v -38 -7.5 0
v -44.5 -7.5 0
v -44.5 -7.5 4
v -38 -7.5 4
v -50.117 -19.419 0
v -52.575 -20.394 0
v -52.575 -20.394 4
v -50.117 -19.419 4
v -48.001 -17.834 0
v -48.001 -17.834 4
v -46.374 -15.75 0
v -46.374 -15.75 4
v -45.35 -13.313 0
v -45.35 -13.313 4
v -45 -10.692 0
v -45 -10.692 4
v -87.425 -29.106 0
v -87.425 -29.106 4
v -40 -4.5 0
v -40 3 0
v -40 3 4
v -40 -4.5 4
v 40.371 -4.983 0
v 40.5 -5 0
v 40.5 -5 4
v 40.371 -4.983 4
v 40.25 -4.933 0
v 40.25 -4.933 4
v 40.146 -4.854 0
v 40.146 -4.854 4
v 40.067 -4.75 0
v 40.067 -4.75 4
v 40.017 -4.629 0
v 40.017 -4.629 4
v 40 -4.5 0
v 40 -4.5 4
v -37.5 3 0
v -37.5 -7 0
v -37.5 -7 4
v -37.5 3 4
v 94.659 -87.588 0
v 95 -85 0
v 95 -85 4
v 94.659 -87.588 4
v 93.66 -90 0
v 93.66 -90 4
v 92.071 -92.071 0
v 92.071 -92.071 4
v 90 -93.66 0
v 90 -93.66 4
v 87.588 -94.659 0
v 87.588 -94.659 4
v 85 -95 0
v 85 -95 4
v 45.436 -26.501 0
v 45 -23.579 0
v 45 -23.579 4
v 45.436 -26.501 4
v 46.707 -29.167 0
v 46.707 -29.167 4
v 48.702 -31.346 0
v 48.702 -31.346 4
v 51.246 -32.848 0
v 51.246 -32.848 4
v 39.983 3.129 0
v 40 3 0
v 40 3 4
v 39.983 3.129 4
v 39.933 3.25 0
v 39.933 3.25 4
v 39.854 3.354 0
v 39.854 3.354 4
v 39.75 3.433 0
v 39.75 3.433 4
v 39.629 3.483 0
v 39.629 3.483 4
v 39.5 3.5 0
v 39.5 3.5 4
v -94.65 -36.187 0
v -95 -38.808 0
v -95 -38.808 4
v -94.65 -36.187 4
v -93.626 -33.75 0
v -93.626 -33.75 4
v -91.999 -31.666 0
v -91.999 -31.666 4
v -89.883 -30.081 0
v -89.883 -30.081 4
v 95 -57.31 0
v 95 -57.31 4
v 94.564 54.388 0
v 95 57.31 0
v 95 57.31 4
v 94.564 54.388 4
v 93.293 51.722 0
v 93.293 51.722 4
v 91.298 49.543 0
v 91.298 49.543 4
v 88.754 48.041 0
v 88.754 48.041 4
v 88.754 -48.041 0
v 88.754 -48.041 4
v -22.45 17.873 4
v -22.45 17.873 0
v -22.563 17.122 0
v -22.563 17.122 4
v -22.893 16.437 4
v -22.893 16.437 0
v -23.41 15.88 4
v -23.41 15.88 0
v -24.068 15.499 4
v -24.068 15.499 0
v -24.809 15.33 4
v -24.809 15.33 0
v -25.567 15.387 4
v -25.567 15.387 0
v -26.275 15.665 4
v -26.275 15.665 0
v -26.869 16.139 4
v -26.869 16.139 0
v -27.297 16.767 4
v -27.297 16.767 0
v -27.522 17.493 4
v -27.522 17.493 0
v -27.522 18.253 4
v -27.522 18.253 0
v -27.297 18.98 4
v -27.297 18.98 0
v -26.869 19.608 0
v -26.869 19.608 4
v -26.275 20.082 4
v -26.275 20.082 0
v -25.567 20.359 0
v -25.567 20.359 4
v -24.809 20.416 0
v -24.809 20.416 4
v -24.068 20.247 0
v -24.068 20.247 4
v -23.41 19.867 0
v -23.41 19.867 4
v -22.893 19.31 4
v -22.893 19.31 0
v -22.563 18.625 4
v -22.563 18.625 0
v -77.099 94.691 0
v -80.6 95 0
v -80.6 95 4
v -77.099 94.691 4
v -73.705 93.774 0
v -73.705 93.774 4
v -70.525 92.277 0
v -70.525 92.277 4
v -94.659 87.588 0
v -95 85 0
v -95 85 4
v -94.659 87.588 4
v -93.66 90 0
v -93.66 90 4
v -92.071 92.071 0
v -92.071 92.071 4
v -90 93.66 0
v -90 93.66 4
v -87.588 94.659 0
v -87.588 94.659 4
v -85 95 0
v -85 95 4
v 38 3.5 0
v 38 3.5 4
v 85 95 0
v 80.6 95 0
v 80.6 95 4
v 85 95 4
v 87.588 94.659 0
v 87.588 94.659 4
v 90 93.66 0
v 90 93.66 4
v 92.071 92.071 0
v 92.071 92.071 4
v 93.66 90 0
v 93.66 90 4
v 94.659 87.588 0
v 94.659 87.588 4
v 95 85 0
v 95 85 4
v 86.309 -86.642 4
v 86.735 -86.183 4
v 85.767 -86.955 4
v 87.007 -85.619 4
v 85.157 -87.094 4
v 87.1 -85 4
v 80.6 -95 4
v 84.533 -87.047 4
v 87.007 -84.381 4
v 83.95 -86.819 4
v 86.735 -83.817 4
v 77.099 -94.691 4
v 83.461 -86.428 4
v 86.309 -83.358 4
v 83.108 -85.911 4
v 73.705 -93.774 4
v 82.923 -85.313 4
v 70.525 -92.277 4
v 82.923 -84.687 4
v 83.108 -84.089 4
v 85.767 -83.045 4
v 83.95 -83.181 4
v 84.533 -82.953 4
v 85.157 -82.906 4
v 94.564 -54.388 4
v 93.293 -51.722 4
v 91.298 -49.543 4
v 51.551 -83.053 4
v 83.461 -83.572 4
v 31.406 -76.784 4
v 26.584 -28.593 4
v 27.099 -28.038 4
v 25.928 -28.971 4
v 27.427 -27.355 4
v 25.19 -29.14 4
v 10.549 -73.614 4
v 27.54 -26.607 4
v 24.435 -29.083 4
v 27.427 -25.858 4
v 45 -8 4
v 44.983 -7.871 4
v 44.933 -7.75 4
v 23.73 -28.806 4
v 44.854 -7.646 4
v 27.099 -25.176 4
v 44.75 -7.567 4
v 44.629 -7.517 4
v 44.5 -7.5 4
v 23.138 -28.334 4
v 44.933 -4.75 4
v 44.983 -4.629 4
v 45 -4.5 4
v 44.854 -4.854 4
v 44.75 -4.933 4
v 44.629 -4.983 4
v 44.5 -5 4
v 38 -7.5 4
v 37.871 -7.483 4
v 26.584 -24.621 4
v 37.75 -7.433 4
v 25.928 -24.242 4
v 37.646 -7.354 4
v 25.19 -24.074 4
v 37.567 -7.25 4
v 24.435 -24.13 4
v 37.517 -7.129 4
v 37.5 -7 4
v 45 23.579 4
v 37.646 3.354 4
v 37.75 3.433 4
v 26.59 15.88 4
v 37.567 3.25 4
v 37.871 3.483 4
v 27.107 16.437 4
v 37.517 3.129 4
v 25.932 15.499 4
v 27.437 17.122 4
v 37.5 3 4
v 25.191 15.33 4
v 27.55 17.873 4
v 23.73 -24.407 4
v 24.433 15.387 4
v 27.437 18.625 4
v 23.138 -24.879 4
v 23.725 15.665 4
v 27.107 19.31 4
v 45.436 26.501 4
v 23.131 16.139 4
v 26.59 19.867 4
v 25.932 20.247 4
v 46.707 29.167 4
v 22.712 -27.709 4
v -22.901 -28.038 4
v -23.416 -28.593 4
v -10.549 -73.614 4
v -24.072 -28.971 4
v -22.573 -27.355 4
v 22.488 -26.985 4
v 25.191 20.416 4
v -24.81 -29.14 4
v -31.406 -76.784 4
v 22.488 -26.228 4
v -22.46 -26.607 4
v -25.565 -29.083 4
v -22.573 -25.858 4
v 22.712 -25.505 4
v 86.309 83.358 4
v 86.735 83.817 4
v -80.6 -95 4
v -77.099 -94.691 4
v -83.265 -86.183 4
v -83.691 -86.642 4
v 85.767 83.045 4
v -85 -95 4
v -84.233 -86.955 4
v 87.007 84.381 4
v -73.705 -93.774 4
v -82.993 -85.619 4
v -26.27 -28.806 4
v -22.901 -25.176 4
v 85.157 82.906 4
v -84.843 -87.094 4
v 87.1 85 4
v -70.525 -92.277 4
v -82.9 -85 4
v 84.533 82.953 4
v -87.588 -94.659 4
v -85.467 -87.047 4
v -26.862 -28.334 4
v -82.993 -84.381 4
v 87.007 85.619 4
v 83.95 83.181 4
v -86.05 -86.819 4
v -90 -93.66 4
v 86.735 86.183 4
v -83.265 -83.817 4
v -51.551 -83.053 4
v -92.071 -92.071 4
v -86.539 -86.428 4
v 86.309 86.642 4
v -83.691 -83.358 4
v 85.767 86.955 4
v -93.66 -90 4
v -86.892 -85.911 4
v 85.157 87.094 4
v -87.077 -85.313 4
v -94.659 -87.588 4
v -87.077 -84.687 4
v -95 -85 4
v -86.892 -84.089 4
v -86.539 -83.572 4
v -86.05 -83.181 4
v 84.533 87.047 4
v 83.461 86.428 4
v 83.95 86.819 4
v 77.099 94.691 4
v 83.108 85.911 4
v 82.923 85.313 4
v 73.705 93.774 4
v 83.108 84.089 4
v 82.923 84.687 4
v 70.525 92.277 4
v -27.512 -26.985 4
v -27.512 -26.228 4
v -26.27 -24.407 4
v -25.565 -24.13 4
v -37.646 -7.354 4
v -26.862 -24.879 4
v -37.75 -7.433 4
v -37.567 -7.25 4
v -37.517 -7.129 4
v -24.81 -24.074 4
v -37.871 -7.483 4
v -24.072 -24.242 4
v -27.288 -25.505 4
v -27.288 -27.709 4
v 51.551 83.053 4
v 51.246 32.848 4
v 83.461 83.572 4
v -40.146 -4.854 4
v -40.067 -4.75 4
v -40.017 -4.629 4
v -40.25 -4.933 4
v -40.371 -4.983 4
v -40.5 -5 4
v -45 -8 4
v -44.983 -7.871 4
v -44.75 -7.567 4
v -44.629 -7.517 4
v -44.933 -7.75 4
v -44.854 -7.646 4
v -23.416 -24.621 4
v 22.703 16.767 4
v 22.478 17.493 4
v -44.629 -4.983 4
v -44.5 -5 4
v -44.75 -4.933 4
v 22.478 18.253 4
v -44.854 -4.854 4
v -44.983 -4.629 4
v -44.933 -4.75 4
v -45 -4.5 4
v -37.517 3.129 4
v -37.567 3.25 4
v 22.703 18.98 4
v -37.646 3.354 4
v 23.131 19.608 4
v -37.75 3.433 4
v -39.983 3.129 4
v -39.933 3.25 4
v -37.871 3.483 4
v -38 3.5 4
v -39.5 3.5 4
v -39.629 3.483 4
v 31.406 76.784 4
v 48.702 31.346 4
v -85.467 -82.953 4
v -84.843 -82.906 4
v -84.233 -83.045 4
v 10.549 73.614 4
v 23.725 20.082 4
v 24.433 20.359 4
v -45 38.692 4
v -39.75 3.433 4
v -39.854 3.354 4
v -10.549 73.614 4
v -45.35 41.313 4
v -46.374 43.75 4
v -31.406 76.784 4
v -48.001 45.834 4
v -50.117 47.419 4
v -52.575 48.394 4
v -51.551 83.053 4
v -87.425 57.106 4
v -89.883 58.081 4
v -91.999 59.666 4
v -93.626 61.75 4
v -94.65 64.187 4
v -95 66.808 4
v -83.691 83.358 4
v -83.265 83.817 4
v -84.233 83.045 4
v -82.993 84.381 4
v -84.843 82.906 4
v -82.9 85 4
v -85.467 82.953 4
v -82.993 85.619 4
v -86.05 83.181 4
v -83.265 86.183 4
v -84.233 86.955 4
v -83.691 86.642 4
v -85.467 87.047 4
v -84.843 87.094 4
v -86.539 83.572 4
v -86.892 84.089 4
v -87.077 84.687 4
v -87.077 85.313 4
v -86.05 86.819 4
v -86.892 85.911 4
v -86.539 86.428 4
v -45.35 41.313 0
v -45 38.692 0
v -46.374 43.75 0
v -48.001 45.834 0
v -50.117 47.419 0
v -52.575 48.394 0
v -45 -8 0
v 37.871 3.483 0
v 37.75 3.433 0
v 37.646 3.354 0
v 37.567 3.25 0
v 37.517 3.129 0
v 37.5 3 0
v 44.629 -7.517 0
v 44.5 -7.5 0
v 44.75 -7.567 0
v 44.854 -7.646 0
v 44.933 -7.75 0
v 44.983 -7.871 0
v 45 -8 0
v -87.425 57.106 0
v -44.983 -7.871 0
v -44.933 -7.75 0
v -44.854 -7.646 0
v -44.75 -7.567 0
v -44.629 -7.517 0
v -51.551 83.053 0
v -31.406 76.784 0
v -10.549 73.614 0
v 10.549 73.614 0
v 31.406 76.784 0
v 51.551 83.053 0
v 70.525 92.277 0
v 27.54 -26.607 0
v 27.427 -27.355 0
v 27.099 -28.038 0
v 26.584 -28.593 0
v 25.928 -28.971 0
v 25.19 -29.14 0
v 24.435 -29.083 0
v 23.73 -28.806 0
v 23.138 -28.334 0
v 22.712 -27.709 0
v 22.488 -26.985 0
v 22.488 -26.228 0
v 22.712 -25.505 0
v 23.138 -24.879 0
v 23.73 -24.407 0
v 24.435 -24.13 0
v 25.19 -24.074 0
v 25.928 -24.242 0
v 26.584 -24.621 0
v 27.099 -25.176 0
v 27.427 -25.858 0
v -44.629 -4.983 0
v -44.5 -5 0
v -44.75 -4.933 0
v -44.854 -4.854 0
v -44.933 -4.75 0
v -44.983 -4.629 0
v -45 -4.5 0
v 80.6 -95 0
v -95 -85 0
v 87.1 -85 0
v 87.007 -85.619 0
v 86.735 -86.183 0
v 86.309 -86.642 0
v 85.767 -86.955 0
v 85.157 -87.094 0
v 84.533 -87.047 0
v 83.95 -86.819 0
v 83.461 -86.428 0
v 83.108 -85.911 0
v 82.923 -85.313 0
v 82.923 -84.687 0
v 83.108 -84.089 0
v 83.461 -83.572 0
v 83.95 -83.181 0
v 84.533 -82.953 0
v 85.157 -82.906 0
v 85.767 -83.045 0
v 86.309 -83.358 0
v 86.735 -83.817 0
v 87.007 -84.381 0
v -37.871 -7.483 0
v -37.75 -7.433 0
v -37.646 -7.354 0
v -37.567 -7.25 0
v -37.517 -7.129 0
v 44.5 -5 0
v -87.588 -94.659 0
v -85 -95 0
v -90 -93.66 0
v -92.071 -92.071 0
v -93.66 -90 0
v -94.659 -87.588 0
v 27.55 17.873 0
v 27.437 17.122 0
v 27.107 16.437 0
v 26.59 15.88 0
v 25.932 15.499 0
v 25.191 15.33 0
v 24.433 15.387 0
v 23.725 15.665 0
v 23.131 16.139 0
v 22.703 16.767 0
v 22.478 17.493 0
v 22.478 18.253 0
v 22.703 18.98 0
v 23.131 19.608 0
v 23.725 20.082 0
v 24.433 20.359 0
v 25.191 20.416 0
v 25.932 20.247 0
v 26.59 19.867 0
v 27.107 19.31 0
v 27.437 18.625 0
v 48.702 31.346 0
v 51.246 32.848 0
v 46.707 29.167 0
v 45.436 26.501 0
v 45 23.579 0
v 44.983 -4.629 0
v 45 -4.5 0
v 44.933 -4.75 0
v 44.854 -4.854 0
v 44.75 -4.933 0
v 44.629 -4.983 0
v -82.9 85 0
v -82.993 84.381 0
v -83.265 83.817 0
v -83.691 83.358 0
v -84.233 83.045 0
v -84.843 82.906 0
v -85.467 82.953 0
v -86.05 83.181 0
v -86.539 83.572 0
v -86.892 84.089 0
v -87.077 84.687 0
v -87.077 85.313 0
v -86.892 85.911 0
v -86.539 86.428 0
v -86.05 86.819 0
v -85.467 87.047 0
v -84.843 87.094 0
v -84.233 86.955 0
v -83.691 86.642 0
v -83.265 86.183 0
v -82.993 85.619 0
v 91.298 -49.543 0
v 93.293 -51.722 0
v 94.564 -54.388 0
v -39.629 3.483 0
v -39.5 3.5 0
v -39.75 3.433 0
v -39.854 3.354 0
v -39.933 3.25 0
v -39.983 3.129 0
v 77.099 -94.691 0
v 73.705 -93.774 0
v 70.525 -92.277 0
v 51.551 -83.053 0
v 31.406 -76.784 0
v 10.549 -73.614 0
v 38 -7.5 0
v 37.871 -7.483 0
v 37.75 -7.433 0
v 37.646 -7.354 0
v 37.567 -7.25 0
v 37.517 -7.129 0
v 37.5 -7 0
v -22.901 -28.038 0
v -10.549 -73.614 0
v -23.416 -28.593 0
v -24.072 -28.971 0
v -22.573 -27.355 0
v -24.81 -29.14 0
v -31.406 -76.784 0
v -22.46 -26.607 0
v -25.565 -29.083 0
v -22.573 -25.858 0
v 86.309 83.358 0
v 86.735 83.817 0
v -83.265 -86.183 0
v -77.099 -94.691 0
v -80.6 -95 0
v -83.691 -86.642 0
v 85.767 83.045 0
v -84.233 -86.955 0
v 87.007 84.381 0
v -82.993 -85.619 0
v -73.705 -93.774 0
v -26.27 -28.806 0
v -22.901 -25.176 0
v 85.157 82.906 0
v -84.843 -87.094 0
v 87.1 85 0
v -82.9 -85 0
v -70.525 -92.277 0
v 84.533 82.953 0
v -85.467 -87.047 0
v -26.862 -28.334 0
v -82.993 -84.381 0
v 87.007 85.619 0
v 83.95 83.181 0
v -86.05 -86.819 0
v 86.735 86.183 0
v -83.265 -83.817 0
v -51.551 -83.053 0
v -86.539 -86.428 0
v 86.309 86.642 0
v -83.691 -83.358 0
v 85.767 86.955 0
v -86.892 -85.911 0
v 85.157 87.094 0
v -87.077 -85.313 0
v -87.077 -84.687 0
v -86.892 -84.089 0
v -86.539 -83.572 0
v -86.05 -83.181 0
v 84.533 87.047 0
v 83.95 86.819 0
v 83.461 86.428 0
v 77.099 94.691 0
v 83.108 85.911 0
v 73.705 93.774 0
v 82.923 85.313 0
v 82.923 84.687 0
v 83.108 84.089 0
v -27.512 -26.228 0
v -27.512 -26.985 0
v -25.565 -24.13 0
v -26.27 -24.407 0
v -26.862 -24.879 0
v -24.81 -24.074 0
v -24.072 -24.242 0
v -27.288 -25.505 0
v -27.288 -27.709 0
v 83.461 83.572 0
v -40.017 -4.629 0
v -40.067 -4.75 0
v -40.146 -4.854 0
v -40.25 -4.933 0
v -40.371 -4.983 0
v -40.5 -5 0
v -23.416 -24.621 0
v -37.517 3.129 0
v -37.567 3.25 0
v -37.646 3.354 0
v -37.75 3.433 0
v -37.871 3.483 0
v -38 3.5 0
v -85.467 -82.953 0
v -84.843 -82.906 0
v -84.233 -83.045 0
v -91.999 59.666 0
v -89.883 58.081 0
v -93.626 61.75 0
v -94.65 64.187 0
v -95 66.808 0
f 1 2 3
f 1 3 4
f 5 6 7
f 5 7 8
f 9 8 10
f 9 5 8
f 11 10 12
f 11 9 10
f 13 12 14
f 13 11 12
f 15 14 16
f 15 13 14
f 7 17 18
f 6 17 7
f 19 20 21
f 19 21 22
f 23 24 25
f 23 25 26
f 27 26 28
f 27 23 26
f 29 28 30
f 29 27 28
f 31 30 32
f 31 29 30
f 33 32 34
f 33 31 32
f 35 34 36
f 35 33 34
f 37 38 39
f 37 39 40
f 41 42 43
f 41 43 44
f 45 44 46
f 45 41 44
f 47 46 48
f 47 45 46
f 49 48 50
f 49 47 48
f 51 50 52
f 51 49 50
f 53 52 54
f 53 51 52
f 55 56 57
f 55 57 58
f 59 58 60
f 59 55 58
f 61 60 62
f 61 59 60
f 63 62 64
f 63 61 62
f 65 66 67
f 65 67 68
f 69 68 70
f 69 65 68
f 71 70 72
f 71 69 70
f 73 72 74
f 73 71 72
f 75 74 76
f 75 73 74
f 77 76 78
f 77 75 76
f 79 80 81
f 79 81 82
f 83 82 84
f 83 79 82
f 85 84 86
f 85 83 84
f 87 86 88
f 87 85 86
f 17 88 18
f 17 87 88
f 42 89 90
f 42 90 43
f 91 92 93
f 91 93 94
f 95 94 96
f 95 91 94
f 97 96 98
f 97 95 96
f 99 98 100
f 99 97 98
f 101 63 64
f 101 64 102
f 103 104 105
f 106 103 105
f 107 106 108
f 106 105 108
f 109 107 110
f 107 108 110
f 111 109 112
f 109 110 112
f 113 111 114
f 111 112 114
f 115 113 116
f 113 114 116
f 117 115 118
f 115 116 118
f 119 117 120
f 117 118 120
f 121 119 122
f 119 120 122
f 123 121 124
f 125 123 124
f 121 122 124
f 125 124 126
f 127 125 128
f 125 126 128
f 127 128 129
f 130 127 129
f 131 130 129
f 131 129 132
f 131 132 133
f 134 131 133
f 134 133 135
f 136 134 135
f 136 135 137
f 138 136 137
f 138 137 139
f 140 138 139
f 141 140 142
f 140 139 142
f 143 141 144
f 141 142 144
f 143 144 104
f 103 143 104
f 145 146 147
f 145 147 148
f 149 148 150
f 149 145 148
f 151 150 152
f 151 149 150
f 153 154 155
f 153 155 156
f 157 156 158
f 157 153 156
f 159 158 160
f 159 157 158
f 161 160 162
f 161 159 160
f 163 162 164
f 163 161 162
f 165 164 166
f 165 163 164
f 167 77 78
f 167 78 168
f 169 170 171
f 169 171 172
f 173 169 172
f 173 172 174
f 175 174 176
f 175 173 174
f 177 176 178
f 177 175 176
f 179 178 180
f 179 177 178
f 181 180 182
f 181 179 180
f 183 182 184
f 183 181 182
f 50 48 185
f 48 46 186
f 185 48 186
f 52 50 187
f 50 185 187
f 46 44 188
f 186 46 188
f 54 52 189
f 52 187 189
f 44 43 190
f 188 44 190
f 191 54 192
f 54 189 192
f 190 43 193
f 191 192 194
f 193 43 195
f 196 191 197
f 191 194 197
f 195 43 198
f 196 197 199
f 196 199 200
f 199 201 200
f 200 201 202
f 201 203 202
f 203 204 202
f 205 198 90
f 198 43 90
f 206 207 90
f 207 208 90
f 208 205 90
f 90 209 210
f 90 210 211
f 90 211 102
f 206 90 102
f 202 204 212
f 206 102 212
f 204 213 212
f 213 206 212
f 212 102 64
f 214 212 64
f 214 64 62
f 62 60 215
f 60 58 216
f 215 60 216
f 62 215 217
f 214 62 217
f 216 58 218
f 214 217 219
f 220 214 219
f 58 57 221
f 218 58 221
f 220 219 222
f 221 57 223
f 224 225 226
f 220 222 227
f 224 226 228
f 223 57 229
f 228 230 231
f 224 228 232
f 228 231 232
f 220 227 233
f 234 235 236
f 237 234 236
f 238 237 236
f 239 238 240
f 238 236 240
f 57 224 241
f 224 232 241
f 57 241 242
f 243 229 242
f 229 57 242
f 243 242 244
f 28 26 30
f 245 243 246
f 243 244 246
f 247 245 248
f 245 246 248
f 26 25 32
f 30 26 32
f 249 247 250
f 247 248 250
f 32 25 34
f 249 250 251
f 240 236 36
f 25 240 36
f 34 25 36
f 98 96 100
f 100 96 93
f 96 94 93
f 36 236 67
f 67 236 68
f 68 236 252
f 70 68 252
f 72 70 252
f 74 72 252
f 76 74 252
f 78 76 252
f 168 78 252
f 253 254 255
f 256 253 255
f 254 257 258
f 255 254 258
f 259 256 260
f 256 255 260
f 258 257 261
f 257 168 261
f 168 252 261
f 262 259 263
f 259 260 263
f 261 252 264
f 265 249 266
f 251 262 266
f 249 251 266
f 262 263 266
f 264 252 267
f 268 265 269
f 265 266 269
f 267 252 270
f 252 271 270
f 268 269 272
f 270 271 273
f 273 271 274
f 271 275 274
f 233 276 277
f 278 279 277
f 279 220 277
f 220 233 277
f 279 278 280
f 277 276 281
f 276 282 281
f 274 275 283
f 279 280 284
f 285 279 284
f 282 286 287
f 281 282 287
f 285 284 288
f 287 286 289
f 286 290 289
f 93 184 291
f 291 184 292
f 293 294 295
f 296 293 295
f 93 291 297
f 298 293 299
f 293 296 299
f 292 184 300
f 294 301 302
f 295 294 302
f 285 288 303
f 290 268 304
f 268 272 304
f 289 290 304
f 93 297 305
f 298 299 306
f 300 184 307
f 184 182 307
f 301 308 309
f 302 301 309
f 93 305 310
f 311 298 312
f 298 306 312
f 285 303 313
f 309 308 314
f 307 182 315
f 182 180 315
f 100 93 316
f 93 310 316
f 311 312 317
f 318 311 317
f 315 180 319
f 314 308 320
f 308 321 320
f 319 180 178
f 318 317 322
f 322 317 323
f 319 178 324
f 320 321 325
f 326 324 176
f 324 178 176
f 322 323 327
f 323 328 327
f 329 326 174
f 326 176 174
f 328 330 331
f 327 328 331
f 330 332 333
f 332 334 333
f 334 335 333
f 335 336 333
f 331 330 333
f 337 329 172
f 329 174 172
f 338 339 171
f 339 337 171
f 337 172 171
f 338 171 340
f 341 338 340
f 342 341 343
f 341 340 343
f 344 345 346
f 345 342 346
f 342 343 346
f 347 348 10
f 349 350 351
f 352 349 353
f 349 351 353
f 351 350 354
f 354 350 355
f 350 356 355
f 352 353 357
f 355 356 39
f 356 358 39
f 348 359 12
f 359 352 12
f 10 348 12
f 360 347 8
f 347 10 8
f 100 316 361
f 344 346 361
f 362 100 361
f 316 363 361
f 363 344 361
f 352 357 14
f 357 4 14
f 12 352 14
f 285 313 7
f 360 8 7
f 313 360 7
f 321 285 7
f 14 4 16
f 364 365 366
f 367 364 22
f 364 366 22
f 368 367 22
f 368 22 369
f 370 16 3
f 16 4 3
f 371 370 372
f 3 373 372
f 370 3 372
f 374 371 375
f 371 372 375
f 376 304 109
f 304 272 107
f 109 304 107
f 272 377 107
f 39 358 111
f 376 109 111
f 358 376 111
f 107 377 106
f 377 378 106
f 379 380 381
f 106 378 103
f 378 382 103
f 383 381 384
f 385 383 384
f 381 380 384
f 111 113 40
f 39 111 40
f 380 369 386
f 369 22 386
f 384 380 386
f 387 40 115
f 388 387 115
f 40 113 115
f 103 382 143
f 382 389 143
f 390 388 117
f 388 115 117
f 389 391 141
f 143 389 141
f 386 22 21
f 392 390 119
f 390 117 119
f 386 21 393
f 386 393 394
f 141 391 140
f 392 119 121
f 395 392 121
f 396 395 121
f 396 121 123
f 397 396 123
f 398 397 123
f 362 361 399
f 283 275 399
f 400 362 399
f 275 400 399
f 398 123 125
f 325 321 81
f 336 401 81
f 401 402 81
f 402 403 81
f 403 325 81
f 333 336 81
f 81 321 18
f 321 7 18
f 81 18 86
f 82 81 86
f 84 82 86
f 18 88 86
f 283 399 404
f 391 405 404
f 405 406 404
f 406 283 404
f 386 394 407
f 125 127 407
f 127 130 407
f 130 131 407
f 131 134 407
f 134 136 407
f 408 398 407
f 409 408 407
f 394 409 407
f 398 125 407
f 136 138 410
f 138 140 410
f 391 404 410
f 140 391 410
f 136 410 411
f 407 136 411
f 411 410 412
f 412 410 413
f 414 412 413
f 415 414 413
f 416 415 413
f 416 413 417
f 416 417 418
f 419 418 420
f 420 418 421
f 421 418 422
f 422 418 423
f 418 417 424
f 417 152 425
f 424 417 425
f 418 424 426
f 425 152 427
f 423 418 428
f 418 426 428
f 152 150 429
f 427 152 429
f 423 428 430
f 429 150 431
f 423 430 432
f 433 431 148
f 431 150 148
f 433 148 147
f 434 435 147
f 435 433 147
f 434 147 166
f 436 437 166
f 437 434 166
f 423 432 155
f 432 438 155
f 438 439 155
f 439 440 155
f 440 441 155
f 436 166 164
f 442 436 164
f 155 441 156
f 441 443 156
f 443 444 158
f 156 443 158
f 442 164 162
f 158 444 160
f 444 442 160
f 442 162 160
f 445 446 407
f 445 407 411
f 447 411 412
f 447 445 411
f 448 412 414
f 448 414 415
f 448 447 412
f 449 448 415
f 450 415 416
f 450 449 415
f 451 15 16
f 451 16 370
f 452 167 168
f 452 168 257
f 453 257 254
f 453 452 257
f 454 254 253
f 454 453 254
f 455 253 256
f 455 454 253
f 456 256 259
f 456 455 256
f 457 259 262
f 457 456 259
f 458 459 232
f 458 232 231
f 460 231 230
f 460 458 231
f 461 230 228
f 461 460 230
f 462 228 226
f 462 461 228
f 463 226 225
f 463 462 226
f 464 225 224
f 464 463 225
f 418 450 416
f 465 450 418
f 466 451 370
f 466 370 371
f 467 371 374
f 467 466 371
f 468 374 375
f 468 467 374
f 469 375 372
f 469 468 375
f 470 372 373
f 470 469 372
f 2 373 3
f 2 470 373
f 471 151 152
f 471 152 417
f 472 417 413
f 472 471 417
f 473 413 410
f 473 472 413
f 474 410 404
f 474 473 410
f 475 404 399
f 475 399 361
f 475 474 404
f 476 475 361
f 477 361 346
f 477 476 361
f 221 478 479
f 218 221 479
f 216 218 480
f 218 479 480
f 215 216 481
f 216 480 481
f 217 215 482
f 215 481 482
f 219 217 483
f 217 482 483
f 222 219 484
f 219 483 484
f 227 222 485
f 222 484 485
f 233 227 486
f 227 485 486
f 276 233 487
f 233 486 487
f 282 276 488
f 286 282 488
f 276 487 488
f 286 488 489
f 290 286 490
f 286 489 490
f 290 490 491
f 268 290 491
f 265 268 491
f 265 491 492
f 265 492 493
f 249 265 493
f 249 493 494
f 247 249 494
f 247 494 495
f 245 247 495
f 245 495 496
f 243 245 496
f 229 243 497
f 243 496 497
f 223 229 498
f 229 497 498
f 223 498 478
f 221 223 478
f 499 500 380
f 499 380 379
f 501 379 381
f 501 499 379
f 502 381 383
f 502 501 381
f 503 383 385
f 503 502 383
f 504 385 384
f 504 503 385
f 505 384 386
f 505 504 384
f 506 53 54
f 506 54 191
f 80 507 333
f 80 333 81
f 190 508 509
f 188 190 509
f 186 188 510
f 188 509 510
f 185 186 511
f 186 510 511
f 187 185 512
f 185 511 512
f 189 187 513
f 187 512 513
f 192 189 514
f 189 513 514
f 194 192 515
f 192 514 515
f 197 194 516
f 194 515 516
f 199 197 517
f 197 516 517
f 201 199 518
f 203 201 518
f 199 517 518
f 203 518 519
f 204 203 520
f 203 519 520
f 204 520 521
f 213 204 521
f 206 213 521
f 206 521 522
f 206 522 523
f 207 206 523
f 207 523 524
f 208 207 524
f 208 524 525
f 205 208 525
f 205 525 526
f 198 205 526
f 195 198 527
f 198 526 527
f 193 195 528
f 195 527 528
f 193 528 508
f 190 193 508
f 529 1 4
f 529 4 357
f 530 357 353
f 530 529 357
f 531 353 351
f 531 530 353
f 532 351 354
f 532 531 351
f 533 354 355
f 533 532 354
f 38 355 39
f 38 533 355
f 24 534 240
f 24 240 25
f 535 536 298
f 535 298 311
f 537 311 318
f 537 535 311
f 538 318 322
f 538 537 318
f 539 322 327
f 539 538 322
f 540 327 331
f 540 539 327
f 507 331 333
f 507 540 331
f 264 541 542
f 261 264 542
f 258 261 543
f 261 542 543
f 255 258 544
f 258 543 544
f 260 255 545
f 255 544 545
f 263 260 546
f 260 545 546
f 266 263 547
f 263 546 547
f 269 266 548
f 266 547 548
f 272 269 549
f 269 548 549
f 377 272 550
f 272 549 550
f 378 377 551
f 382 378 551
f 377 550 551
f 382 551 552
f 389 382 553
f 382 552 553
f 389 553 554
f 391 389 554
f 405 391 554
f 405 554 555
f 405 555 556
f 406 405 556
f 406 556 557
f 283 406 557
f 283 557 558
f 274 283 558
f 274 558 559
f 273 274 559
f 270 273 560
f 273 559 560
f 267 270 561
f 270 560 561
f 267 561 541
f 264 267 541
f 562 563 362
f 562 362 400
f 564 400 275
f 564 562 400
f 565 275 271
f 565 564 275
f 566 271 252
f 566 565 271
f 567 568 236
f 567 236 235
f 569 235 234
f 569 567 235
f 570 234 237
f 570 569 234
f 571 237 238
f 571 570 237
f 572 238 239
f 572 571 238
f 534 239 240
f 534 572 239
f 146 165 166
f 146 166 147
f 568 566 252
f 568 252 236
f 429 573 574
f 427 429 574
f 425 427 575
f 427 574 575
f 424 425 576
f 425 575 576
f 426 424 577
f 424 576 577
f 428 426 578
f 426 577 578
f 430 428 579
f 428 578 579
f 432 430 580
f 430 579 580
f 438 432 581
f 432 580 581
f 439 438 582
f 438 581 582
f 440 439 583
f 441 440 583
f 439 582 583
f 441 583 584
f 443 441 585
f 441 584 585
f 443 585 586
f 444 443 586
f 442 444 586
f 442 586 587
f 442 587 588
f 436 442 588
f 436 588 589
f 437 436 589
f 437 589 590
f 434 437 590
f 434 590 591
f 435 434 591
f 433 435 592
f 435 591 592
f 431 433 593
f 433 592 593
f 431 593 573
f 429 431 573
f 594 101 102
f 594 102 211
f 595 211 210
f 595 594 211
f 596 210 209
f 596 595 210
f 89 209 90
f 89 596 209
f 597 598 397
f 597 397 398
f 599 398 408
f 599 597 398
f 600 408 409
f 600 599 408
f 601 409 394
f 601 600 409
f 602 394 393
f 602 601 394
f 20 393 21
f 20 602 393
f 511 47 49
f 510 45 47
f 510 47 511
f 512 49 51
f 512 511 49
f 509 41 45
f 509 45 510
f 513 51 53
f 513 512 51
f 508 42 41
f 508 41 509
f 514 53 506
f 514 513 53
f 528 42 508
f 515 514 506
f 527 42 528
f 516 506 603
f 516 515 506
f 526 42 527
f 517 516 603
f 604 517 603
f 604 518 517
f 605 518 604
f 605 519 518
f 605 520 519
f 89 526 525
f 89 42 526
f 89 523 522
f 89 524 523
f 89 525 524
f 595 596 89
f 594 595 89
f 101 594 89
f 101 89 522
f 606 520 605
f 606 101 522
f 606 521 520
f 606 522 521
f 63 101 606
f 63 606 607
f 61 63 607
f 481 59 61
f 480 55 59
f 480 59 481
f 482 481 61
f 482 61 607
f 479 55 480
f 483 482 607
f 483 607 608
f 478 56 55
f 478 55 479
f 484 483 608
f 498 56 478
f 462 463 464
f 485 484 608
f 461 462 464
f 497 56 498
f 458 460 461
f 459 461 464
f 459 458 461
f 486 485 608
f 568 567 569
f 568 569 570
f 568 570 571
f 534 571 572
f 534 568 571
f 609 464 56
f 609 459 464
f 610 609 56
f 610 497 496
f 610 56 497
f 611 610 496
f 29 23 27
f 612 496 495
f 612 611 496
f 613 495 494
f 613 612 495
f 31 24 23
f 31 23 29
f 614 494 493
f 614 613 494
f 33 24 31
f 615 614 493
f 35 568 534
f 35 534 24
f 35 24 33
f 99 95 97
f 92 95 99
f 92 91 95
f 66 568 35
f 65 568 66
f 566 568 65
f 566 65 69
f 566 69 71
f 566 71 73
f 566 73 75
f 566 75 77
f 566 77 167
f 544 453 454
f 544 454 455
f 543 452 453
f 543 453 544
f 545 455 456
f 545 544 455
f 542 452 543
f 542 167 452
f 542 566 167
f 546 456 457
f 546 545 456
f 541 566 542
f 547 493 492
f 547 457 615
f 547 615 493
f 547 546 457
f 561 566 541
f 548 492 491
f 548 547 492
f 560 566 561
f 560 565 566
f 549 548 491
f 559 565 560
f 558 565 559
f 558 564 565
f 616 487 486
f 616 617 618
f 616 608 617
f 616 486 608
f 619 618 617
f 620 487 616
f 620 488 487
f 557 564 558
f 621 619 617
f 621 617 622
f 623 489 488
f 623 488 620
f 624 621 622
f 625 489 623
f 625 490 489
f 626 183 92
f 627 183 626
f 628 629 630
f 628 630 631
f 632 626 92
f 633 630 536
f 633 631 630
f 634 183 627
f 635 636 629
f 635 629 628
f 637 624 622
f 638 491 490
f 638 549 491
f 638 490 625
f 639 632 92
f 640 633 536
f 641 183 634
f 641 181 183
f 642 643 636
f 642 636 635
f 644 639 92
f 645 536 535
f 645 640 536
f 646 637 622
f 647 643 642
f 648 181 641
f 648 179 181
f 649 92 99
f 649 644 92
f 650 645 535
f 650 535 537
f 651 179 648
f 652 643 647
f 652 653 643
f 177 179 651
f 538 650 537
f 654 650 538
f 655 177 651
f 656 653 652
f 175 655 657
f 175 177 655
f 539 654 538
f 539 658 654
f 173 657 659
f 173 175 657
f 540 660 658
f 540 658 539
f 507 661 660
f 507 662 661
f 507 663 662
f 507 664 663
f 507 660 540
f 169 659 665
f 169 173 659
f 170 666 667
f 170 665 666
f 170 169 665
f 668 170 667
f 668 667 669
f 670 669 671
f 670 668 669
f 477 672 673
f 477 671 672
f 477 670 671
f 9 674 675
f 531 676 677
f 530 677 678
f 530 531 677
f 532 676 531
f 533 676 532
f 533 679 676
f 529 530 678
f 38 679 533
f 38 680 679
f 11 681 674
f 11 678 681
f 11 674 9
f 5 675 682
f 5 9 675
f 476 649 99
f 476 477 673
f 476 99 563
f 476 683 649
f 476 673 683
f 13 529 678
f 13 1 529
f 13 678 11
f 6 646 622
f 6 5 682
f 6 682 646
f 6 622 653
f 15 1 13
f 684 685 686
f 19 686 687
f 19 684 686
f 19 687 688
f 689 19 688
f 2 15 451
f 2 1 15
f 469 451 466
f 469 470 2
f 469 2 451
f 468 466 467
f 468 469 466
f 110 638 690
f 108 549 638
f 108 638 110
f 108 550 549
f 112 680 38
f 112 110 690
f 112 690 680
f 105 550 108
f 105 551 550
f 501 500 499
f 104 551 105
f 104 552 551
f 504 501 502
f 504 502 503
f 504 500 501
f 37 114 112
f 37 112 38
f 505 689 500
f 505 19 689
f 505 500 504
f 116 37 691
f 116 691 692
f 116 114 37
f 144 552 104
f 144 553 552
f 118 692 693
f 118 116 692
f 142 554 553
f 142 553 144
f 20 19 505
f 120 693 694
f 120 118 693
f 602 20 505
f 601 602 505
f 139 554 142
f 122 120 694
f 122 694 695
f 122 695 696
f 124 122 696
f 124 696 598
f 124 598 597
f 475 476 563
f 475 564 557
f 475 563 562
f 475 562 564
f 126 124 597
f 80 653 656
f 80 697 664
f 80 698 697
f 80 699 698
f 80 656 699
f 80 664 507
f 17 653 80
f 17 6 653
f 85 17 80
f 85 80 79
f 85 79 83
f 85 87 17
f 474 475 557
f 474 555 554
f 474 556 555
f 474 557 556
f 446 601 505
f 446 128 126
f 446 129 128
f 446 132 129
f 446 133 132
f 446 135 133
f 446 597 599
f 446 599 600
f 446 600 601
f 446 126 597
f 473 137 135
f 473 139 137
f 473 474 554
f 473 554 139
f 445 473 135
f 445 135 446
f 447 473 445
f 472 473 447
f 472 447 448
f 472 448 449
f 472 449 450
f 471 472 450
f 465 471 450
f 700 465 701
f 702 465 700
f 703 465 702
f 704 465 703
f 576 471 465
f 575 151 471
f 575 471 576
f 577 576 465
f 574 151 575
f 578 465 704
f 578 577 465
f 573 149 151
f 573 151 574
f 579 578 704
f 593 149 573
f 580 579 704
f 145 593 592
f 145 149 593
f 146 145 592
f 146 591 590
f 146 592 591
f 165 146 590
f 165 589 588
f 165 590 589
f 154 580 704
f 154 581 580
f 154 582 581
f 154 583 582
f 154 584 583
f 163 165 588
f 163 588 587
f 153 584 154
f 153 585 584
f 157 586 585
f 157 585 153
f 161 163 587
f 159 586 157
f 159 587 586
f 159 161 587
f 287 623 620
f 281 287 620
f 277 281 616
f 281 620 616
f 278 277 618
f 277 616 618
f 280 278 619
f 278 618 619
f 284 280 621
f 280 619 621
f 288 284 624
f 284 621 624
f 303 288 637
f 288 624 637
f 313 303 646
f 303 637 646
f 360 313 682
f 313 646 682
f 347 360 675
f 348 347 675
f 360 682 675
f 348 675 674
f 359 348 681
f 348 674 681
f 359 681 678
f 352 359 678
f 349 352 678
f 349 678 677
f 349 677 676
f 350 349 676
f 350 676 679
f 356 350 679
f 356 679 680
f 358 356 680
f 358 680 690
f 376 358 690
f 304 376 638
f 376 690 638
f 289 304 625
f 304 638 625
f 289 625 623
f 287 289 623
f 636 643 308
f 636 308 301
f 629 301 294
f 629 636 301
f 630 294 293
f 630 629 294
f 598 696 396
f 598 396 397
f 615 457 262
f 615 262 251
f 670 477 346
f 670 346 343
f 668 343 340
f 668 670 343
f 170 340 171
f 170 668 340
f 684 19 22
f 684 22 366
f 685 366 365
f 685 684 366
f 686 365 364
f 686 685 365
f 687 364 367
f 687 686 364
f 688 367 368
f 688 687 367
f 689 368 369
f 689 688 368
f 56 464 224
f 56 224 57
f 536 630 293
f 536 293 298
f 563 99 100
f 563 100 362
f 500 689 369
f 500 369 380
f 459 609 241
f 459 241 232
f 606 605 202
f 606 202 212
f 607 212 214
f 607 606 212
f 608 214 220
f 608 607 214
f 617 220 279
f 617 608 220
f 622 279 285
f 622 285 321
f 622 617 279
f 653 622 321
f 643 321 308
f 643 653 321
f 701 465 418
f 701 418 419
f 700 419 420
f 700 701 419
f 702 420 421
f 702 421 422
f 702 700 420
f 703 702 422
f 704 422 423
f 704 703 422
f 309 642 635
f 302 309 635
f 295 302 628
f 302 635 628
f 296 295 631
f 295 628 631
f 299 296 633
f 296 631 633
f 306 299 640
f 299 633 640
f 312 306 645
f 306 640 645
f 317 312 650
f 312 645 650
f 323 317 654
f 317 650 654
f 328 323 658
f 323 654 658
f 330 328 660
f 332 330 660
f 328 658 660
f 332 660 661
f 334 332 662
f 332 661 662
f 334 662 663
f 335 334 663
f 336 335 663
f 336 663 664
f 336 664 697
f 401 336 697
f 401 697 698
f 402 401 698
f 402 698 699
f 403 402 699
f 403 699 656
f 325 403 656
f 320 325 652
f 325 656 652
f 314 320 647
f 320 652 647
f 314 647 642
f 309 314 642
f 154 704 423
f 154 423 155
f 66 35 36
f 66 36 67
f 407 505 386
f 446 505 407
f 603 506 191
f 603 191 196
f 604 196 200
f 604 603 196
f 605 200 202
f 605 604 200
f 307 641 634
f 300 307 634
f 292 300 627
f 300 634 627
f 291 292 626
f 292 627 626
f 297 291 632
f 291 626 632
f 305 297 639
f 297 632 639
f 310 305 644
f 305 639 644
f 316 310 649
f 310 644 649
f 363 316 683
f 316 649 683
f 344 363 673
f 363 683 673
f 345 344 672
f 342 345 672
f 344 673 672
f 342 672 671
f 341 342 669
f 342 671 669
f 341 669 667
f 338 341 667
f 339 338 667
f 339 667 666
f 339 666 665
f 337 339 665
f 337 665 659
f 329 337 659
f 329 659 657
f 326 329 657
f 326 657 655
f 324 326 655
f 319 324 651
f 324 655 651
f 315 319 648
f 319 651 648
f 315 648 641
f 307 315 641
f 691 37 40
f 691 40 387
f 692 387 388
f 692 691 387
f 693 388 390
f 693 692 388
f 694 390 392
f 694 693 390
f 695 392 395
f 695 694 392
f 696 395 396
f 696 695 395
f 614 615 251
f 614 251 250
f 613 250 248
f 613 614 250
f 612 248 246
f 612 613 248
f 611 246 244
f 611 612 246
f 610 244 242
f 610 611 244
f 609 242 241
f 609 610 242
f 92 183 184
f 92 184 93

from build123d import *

# Parameters (mm, degrees)
SKETCH1_R           = 2.1
SKETCH1_R_2         = 2.55
SKETCH1_R_3         = 2.54
BOSS_EXTRUDE1_DEPTH = 4


with BuildPart() as part:
    # Sketch1 → Boss-Extrude1 (new body)
    with BuildSketch(Plane(origin=(0, 0, 0), x_dir=(-1, 0, 0), z_dir=(0, 0, -1))):
        with BuildLine():
            Line((87.42535625, -29.106339063), (52.57464375, -20.393660937))
            ThreePointArc((52.57464375, -20.393660937), (47.11794562, -16.84635803), (45, -10.692235936))
            Line((45, -10.692235936), (45, -8))
            ThreePointArc((45, -8), (44.853553391, -7.646446609), (44.5, -7.5))
            Line((44.5, -7.5), (38, -7.5))
            ThreePointArc((38, -7.5), (37.646446609, -7.353553391), (37.5, -7))
            Line((37.5, -7), (37.5, 3))
            ThreePointArc((37.5, 3), (37.646446609, 3.353553391), (38, 3.5))
            Line((38, 3.5), (39.5, 3.5))
            ThreePointArc((39.5, 3.5), (39.853553391, 3.353553391), (40, 3))
            Line((40, 3), (40, -4.5))
            ThreePointArc((40, -4.5), (40.146446609, -4.853553391), (40.5, -5))
            Line((40.5, -5), (44.5, -5))
            ThreePointArc((44.5, -5), (44.853553391, -4.853553391), (45, -4.5))
            Line((45, -4.5), (45, 38.692235936))
            ThreePointArc((45, 38.692235936), (47.11794562, 44.84635803), (52.57464375, 48.393660937))
            Line((52.57464375, 48.393660937), (87.42535625, 57.106339063))
            ThreePointArc((87.42535625, 57.106339063), (92.88205438, 60.65364197), (95, 66.807764064))
            Line((95, 66.807764064), (95, 85))
            ThreePointArc((95, 85), (92.071067812, 92.071067812), (85, 95))
            Line((85, 95), (80.600023778, 95))
            ThreePointArc((80.600023778, 95), (75.38177505, 94.307249421), (70.525020806, 92.276988022))
            ThreePointArc((70.525020806, 92.276988022), (0, 73.215904175), (-70.525020806, 92.276988022))
            ThreePointArc((-70.525020806, 92.276988022), (-75.38177505, 94.307249421), (-80.600023778, 95))
            Line((-80.600023778, 95), (-85, 95))
            ThreePointArc((-85, 95), (-92.071067812, 92.071067812), (-95, 85))
            Line((-95, 85), (-95, 57.30993956))
            ThreePointArc((-95, 57.30993956), (-93.292887614, 51.721736358), (-88.754396995, 48.041471336))
            Line((-88.754396995, 48.041471336), (-51.245603005, 32.847708996))
            ThreePointArc((-51.245603005, 32.847708996), (-46.707112386, 29.167443975), (-45, 23.579240773))
            Line((-45, 23.579240773), (-45, -4.5))
            ThreePointArc((-45, -4.5), (-44.853553391, -4.853553391), (-44.5, -5))
            Line((-44.5, -5), (-40.5, -5))
            ThreePointArc((-40.5, -5), (-40.146446609, -4.853553391), (-40, -4.5))
            Line((-40, -4.5), (-40, 3))
            ThreePointArc((-40, 3), (-39.853553391, 3.353553391), (-39.5, 3.5))
            Line((-39.5, 3.5), (-38, 3.5))
            ThreePointArc((-38, 3.5), (-37.646446609, 3.353553391), (-37.5, 3))
            Line((-37.5, 3), (-37.5, -7))
            ThreePointArc((-37.5, -7), (-37.646446609, -7.353553391), (-38, -7.5))
            Line((-38, -7.5), (-44.5, -7.5))
            ThreePointArc((-44.5, -7.5), (-44.853553391, -7.646446609), (-45, -8))
            Line((-45, -8), (-45, -23.579240773))
            ThreePointArc((-45, -23.579240773), (-46.707112386, -29.167443975), (-51.245603005, -32.847708996))
            Line((-51.245603005, -32.847708996), (-88.754396995, -48.041471336))
            ThreePointArc((-88.754396995, -48.041471336), (-93.292887614, -51.721736358), (-95, -57.30993956))
            Line((-95, -57.30993956), (-95, -85))
            ThreePointArc((-95, -85), (-92.071067812, -92.071067812), (-85, -95))
            Line((-85, -95), (-80.600023778, -95))
            ThreePointArc((-80.600023778, -95), (-75.38177505, -94.307249421), (-70.525020806, -92.276988022))
            ThreePointArc((-70.525020806, -92.276988022), (0, -73.215904175), (70.525020806, -92.276988022))
            ThreePointArc((70.525020806, -92.276988022), (75.38177505, -94.307249421), (80.600023778, -95))
            Line((80.600023778, -95), (85, -95))
            ThreePointArc((85, -95), (92.071067812, -92.071067812), (95, -85))
            Line((95, -85), (95, -38.807764064))
            ThreePointArc((95, -38.807764064), (92.88205438, -32.65364197), (87.42535625, -29.106339063))
        make_face()
        with Locations(Location((-85, -85, 0), (0, 0, 180))):
            Circle(SKETCH1_R, mode=Mode.SUBTRACT)
        with Locations(Location((-85, 85, 0), (0, 0, 180))):
            Circle(SKETCH1_R, mode=Mode.SUBTRACT)
        with Locations(Location((85, 85, 0), (0, 0, 180))):
            Circle(SKETCH1_R, mode=Mode.SUBTRACT)
        with Locations(Location((85, -85, 0), (0, 0, 180))):
            Circle(SKETCH1_R, mode=Mode.SUBTRACT)
        with Locations(Location((25, 17.873209062, 0), (0, 0, 180))):
            Circle(SKETCH1_R_2, mode=Mode.SUBTRACT)
        with Locations(Location((25, -26.606790938, 0), (0, 0, 180))):
            Circle(SKETCH1_R_3, mode=Mode.SUBTRACT)
        with Locations(Location((-25, -26.606790938, 0), (0, 0, 180))):
            Circle(SKETCH1_R_3, mode=Mode.SUBTRACT)
        with Locations(Location((-25, 17.873209062, 0), (0, 0, 180))):
            Circle(SKETCH1_R_2, mode=Mode.SUBTRACT)
    extrude(amount=-BOSS_EXTRUDE1_DEPTH)


solid = part.part
